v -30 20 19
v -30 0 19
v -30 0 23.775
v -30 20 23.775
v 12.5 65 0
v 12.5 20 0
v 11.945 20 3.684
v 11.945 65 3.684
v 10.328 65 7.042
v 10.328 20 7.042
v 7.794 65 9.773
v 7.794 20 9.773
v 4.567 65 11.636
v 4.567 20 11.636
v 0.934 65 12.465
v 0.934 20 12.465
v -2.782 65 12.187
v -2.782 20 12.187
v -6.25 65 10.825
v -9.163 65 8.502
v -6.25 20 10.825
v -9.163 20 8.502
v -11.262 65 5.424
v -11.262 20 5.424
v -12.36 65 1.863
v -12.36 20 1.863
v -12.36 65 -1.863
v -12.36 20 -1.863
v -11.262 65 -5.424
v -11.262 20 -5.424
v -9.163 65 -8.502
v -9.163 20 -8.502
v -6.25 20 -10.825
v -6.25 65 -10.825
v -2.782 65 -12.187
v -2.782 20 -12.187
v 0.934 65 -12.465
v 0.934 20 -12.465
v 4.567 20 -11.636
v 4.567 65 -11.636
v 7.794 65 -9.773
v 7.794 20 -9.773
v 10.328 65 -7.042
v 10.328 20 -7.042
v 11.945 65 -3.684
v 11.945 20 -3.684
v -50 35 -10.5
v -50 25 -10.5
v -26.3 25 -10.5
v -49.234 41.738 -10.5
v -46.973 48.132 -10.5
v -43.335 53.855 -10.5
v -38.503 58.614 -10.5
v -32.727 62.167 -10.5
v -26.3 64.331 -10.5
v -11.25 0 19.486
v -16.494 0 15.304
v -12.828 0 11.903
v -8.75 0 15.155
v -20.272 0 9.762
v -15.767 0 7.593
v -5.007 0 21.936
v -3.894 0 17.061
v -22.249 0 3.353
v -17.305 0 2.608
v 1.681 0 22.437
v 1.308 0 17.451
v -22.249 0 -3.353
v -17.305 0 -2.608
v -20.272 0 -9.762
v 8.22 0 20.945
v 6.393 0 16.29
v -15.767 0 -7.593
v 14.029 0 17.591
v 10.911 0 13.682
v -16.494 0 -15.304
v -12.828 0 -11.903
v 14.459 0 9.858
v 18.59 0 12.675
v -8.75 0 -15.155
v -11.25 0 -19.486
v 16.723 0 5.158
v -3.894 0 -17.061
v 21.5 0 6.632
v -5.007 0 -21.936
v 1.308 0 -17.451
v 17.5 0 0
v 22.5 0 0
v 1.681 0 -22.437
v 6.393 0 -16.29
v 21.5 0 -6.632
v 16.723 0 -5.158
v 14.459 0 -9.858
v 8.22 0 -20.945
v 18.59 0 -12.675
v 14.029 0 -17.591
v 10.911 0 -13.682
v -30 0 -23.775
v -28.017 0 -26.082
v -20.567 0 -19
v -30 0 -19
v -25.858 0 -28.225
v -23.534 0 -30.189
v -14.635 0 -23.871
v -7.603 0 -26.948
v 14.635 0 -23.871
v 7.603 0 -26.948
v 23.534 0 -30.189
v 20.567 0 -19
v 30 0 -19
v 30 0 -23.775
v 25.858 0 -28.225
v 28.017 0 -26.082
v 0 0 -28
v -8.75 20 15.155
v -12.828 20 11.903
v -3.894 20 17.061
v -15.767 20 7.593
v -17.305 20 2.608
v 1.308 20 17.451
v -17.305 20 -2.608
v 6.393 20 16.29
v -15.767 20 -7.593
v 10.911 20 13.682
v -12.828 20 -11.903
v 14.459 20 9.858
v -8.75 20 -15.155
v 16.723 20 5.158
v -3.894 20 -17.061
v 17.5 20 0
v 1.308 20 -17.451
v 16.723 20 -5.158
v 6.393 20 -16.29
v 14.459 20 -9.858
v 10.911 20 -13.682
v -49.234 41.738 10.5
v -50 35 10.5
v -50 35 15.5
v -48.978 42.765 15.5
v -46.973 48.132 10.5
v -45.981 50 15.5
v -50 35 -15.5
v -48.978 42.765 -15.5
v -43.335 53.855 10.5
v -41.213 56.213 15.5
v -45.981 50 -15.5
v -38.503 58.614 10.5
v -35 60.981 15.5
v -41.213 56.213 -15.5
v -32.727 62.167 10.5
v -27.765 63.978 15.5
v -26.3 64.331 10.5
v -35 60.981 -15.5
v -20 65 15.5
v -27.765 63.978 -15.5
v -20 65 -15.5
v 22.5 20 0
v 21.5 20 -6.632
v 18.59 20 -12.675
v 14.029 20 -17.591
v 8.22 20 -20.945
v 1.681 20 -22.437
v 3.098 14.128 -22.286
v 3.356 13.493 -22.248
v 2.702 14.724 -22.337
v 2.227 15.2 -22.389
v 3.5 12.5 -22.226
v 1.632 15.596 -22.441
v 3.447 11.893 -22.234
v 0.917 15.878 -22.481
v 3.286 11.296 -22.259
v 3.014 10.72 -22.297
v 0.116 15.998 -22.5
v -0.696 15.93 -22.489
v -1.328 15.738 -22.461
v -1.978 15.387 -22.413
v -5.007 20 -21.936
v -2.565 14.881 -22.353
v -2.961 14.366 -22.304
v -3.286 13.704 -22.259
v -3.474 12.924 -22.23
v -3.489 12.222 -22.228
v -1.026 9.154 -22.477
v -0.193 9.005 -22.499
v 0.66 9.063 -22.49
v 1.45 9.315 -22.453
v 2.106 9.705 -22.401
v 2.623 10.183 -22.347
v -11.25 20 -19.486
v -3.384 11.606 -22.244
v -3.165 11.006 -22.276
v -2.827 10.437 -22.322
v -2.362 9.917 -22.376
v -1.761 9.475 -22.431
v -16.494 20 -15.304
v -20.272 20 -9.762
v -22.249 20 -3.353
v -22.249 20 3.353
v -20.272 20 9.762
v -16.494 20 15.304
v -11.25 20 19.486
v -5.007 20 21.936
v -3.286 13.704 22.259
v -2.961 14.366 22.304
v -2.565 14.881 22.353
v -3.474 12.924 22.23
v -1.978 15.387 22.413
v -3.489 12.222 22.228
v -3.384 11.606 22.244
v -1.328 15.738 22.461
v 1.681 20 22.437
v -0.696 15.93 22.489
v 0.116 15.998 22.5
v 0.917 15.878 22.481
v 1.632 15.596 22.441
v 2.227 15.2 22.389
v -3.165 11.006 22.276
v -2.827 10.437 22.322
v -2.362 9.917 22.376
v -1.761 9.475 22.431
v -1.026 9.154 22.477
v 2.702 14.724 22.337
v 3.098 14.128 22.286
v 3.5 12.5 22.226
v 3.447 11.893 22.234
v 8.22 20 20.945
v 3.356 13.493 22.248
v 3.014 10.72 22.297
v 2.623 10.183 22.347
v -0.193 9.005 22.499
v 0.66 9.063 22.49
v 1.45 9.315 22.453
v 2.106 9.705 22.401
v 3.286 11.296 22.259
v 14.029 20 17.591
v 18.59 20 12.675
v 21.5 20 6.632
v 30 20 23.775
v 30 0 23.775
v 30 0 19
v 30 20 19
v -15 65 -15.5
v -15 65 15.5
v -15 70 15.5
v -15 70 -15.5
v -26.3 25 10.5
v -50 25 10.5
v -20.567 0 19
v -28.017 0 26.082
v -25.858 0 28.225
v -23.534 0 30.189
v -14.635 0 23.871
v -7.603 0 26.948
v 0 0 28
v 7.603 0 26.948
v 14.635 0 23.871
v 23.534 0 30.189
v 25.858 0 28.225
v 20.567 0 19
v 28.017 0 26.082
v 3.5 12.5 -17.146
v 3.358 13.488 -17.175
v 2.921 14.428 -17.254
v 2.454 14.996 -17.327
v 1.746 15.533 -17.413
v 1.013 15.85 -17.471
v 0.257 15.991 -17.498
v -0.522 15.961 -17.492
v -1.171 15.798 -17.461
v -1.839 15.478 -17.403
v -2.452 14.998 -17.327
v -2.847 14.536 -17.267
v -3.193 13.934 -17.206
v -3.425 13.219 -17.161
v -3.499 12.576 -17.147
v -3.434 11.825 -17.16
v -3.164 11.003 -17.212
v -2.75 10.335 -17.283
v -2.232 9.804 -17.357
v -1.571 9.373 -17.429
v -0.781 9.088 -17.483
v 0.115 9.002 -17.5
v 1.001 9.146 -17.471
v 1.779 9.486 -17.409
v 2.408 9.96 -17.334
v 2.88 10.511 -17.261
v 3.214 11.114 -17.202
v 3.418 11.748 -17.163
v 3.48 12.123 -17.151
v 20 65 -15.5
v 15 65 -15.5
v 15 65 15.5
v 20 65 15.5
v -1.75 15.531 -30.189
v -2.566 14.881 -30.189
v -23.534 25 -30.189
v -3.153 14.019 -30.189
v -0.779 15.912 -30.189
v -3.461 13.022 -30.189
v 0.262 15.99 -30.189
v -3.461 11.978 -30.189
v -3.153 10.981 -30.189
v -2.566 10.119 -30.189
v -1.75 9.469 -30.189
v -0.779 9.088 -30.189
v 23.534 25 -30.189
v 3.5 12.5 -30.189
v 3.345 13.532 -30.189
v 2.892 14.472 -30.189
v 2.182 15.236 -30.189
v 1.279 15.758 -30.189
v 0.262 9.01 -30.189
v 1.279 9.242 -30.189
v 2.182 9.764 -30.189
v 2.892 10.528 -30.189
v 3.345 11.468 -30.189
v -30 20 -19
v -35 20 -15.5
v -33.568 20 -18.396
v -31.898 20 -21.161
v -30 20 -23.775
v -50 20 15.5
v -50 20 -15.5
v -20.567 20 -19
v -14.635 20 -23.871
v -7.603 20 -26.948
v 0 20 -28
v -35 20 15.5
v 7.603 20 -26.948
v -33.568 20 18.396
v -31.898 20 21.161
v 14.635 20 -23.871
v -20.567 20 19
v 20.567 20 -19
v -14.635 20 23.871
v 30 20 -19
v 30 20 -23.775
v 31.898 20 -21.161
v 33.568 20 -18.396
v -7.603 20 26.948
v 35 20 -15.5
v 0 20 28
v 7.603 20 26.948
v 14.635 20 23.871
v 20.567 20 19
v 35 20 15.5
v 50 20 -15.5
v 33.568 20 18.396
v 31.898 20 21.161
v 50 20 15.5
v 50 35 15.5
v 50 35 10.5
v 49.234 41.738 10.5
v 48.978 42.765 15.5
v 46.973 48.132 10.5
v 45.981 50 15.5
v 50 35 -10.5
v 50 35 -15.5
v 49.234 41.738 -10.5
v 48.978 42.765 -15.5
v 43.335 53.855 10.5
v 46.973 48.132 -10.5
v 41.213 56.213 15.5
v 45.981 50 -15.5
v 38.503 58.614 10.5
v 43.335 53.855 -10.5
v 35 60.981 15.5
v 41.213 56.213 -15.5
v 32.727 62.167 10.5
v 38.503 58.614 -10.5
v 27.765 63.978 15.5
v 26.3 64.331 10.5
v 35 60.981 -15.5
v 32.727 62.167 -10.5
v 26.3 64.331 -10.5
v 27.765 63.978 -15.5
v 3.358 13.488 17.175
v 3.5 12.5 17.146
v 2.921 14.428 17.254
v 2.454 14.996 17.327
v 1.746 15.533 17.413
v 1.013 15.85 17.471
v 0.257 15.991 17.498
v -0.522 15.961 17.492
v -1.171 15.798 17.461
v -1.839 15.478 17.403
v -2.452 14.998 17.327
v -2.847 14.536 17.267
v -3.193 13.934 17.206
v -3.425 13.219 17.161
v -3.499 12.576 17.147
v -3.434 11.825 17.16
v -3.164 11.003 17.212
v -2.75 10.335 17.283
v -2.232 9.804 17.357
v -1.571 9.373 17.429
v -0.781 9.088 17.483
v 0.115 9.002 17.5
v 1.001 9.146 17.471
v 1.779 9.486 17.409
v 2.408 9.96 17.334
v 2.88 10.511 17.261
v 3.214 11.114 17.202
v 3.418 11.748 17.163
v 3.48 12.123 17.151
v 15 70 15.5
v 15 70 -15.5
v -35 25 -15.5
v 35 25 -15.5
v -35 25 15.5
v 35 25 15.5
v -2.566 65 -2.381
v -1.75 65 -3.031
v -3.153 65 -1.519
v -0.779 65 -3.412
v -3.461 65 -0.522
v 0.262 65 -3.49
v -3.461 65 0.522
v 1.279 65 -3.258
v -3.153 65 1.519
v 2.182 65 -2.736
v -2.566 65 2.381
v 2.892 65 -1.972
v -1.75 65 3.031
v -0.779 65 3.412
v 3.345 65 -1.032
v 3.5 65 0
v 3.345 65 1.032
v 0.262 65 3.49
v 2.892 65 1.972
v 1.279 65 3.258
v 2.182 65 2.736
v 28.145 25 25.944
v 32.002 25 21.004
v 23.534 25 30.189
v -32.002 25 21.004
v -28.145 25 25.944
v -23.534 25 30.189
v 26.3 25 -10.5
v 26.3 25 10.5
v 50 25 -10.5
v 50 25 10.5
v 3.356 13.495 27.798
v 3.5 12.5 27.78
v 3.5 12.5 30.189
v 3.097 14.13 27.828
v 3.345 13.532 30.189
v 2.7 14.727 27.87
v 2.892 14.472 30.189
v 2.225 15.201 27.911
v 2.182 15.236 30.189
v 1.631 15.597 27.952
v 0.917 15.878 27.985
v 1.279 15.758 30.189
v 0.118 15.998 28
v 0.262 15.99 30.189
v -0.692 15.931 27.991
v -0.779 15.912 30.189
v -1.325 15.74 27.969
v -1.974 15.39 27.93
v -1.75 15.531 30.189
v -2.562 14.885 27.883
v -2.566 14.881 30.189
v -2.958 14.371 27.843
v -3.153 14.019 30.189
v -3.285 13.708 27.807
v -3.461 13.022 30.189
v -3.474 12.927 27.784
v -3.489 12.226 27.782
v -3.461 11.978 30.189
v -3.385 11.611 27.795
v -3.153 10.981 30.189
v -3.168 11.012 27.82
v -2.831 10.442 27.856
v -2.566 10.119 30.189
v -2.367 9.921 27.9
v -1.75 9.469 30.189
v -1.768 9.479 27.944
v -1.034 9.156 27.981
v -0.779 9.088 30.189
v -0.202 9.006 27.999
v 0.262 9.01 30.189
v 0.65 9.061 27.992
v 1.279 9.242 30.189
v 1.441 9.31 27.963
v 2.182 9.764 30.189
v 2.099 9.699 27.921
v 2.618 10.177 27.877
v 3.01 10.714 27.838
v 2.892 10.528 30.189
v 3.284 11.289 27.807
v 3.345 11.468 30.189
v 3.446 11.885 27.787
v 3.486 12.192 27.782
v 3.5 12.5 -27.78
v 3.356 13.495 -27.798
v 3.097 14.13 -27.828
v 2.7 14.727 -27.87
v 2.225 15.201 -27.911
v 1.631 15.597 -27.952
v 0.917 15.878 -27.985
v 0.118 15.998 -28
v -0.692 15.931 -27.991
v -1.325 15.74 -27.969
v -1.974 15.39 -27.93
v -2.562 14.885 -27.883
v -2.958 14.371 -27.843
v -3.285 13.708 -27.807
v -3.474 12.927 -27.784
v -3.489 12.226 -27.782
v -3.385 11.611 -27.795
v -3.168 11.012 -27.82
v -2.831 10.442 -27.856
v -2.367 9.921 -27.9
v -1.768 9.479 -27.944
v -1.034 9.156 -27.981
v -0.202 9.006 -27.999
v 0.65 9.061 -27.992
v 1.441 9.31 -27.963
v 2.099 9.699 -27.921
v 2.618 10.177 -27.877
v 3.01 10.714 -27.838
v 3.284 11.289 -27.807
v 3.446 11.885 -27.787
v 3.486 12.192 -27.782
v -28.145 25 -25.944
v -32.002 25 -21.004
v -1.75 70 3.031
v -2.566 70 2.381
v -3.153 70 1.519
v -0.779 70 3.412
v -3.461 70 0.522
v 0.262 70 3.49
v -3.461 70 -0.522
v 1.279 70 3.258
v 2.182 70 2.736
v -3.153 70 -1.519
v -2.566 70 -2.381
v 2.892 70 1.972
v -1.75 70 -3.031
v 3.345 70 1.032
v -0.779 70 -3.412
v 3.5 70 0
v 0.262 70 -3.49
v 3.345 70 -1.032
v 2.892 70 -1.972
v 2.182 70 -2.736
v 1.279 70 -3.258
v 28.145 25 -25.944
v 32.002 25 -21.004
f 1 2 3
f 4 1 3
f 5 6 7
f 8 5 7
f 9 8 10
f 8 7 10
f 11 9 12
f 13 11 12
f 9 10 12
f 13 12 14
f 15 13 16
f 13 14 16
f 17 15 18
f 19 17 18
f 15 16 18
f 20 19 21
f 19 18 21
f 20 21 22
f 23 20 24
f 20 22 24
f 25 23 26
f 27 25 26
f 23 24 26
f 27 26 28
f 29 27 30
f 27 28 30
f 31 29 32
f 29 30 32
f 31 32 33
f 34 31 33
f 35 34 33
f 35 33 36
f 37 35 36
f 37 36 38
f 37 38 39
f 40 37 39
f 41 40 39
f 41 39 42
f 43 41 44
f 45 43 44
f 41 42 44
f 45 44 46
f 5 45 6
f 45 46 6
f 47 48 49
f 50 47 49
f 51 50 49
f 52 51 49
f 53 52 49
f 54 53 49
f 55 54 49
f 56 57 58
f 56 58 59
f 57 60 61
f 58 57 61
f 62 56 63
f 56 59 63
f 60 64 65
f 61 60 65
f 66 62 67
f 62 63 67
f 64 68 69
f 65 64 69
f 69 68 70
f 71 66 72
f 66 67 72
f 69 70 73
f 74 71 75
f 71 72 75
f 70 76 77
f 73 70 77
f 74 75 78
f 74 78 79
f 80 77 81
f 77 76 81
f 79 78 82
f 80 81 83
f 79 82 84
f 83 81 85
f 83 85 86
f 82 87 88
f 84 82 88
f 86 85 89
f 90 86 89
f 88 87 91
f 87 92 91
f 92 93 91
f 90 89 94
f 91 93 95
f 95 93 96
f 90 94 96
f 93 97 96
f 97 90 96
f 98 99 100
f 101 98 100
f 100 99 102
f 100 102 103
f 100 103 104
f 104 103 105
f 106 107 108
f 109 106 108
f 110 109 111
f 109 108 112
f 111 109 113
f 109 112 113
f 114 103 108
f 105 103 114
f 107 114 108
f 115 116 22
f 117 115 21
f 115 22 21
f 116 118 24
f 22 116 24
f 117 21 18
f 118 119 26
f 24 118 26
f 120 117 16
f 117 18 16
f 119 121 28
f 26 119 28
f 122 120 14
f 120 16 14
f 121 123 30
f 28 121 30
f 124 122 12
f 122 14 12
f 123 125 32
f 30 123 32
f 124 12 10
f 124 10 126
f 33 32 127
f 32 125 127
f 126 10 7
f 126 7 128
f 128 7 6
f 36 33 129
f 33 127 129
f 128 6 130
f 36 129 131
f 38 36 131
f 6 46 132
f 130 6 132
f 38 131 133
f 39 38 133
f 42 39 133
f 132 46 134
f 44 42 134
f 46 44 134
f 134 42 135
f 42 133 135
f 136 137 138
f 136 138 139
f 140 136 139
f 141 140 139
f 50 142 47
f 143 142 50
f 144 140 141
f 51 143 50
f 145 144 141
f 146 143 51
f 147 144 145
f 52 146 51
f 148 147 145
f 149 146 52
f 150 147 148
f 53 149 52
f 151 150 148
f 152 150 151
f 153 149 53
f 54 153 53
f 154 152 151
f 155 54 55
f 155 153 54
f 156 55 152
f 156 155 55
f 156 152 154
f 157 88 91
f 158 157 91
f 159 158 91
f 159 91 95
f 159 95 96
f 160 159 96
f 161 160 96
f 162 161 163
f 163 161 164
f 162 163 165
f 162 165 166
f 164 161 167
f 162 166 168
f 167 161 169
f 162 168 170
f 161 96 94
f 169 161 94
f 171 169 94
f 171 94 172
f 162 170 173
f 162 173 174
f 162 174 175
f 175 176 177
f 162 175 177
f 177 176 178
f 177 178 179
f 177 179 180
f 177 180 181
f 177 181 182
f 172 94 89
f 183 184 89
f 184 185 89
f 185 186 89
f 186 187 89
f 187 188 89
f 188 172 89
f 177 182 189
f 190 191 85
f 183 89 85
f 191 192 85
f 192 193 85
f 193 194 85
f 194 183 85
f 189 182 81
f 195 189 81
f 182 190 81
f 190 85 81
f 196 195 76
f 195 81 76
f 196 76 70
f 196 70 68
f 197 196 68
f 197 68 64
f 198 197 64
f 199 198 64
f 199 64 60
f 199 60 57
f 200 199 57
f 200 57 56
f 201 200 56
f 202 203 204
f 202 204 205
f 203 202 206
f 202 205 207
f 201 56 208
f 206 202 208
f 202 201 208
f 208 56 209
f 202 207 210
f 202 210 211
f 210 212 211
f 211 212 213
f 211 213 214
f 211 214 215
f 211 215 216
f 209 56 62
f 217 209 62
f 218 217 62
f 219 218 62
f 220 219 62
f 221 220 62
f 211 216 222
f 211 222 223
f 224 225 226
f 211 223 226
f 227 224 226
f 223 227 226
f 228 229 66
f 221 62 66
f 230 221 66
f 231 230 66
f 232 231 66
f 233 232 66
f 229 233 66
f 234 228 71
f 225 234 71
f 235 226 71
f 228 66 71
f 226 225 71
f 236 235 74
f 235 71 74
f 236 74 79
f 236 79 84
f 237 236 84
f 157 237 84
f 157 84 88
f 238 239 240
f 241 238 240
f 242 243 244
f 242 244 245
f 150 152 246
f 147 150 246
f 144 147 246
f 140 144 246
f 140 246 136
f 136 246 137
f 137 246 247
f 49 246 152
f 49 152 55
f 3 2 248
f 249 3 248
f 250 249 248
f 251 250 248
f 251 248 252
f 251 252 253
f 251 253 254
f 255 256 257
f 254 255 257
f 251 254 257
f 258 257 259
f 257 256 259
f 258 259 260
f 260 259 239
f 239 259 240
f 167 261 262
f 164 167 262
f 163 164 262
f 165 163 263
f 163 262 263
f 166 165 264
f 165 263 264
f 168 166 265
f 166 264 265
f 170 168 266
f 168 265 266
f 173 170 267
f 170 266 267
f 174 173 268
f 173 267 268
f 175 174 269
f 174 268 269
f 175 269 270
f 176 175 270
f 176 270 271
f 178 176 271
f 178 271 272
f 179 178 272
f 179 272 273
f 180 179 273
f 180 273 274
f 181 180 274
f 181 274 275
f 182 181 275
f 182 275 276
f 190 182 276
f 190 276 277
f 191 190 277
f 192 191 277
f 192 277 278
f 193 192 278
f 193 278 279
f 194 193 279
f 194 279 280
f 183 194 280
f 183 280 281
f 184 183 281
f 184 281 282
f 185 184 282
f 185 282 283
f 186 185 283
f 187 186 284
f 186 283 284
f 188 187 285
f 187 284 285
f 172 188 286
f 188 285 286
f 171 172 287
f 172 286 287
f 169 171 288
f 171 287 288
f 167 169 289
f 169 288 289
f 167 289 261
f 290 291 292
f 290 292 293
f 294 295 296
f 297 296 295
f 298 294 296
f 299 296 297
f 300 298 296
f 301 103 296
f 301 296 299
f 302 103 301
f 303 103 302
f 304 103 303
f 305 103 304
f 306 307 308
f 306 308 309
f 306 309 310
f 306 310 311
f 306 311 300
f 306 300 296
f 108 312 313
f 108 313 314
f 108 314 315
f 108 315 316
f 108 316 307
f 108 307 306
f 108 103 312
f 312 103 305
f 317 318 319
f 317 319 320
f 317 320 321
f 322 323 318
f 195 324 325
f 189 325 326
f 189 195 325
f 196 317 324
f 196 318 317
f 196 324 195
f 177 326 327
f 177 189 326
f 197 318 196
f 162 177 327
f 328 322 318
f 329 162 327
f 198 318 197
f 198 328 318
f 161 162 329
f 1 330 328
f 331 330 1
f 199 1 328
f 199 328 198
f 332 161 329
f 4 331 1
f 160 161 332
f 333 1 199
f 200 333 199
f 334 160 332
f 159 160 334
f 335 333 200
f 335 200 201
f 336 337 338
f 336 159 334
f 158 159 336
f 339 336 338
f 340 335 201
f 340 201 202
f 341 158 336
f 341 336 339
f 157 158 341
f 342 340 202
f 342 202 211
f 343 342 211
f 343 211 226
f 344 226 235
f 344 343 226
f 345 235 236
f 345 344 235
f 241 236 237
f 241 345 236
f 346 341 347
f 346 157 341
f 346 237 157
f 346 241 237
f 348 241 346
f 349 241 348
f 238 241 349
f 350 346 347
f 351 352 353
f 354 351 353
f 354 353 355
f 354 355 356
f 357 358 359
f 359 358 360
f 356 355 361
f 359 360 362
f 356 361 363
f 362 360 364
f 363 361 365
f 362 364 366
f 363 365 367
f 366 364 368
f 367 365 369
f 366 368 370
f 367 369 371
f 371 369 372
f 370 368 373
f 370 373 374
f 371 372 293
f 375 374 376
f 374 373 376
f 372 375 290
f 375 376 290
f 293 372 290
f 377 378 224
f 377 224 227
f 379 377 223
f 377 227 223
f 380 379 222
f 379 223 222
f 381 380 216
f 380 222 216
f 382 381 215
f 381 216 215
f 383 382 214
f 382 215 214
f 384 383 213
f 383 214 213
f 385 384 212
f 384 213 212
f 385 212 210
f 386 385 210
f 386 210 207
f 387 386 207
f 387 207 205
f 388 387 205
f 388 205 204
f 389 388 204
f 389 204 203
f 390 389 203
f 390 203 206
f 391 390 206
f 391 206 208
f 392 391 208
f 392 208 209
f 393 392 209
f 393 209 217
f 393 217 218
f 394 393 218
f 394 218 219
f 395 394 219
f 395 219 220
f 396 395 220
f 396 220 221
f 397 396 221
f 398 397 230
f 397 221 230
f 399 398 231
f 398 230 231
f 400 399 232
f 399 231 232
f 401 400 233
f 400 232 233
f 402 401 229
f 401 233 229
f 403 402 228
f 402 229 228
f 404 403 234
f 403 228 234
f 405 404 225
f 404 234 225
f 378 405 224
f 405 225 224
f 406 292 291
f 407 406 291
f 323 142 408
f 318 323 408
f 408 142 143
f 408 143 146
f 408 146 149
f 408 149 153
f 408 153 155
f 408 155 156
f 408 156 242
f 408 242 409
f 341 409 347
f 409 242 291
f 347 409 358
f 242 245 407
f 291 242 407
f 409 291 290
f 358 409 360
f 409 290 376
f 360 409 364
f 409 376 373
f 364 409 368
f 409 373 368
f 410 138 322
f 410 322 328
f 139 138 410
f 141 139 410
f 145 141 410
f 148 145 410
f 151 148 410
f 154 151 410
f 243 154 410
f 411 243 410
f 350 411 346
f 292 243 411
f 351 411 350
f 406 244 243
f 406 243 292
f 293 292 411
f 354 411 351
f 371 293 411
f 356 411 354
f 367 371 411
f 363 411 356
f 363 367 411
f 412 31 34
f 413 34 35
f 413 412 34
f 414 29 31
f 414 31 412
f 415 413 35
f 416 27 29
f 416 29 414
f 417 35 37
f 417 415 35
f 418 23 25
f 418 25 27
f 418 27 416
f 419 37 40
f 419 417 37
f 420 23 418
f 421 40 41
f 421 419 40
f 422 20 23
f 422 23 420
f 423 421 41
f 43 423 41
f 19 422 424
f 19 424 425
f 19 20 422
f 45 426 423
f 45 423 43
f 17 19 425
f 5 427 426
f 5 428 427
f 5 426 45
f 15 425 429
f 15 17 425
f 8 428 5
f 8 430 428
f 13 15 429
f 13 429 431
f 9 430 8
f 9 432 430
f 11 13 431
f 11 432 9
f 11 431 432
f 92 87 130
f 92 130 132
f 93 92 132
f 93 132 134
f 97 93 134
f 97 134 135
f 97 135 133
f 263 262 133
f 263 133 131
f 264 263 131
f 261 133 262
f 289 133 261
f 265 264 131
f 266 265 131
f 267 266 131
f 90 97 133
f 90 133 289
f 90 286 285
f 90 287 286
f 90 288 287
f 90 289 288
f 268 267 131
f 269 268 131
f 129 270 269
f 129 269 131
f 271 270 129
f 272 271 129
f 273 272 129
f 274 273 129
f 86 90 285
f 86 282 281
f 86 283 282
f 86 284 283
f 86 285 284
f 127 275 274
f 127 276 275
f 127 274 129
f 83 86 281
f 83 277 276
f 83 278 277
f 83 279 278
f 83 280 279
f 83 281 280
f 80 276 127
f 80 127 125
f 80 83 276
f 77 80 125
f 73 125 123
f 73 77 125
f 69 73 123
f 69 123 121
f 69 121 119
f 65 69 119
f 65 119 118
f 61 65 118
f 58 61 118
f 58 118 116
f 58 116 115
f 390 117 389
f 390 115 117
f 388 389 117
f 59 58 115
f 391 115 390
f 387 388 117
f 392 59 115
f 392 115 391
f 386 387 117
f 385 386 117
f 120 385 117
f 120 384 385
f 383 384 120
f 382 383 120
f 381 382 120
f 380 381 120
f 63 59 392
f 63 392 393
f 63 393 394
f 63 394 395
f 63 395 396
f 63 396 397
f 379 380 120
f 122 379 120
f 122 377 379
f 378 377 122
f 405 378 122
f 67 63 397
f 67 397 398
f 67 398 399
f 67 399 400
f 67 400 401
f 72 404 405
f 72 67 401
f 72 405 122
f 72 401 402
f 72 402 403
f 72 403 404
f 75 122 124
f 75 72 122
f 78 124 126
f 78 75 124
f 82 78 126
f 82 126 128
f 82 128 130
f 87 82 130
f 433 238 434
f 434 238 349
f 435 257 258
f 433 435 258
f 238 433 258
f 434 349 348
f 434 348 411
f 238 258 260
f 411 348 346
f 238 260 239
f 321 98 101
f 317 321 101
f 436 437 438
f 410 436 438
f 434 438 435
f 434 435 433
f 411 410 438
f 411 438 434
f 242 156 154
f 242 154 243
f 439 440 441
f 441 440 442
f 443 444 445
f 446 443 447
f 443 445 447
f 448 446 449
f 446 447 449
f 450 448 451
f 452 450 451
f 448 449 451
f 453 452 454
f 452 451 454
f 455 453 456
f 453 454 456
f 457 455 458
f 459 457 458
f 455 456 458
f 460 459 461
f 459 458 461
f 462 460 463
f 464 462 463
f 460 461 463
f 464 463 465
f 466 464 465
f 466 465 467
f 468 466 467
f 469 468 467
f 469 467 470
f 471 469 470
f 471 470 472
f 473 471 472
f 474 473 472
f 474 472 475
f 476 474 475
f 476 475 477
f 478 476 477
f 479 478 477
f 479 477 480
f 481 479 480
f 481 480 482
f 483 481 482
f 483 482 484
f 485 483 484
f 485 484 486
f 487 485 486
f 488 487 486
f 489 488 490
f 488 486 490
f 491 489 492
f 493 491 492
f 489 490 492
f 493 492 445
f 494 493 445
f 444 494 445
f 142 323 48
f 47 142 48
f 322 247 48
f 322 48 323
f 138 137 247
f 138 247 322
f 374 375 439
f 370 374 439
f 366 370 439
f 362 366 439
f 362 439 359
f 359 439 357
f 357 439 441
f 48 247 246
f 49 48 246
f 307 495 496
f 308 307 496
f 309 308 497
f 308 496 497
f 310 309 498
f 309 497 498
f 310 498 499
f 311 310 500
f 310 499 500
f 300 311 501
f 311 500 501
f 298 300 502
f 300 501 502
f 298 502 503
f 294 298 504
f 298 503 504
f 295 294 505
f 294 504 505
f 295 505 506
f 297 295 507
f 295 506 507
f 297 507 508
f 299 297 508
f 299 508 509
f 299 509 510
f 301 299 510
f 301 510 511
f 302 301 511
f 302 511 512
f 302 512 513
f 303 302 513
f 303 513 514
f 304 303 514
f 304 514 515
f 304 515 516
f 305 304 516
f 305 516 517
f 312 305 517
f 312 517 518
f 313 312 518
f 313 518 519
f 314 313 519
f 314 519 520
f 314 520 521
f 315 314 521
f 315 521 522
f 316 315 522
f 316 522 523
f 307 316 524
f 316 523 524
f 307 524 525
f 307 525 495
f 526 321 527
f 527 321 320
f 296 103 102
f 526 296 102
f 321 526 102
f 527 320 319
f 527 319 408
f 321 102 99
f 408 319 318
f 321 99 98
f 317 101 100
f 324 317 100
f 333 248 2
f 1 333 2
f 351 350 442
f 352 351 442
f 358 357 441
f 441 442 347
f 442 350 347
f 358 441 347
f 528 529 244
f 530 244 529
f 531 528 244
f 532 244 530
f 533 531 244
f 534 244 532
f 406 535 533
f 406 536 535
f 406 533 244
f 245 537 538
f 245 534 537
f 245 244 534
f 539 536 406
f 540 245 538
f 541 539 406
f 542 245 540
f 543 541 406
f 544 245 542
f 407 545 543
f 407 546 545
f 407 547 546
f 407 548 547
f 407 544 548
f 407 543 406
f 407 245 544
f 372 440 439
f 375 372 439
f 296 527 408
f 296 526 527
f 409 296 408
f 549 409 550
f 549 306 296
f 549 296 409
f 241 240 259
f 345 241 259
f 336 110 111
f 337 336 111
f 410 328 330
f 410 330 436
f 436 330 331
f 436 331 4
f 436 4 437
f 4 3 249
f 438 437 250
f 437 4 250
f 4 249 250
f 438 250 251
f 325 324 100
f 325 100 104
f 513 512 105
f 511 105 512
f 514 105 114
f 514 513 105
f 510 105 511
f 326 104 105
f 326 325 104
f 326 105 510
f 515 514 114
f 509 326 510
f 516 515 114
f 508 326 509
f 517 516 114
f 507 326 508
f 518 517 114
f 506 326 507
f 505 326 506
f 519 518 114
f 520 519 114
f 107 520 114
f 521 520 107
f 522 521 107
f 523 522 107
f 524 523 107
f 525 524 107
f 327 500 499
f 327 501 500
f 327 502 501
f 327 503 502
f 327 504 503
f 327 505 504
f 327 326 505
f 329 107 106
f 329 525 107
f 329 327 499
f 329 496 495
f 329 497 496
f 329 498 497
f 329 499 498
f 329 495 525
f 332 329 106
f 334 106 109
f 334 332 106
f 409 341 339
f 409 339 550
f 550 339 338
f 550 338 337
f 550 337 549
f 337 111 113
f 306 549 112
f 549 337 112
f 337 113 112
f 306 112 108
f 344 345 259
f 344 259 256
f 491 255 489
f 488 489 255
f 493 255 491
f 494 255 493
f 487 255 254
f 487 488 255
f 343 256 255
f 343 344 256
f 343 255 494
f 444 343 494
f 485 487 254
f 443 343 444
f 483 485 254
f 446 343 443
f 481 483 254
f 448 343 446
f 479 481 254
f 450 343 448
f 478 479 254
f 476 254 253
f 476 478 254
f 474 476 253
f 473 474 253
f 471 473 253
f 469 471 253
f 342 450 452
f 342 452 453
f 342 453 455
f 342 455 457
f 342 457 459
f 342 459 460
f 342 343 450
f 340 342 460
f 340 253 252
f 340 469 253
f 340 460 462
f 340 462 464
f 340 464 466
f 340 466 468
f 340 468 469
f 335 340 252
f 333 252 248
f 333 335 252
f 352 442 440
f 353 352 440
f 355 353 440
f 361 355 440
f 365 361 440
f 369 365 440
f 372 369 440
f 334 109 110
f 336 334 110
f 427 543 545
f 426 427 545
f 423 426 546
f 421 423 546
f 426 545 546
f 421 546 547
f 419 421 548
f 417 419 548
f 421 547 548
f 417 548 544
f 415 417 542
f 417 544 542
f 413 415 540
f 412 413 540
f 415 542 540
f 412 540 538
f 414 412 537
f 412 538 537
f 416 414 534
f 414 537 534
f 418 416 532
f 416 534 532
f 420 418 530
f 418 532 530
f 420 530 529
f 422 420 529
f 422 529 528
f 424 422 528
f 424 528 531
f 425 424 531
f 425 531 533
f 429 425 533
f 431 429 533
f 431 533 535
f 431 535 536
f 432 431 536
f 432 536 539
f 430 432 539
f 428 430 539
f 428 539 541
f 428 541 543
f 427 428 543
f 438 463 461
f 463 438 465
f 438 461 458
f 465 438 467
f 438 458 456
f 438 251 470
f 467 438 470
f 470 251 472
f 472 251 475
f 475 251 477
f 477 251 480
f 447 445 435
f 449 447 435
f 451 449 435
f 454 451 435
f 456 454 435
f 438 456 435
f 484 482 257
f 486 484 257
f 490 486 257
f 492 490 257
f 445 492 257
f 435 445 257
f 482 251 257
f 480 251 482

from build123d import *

# Parameters (mm, degrees)
SKETCH1_R               = 22.5
SKETCH1_R_2             = 17.5
BOSS_EXTRUDE1_DEPTH     = 20
BOSS_EXTRUDE5_DEPTH     = 20
BOSS_EXTRUDE5_2_DEPTH   = 20
SKETCH5_W               = 70
SKETCH5_H               = 60.378075934
BOSS_EXTRUDE7_DEPTH     = 5
SKETCH6_W               = 15
SKETCH6_H               = 5
SKETCH6_W_2             = 52.6
SKETCH6_H_2             = 21
BOSS_EXTRUDE8_DEPTH     = 40
SKETCH7_W               = 100
SKETCH7_H               = 31
BOSS_EXTRUDE9_DEPTH     = 5
CUT_EXTRUDE1_DEPTH      = 1
CUT_EXTRUDE1_DEPTH_BACK = 66
FILLET1_R               = 30
SKETCH9_W               = 30
SKETCH9_H               = 31
BOSS_EXTRUDE10_DEPTH    = 5
SKETCH10_R              = 3.5
CUT_EXTRUDE2_DEPTH      = 71
SKETCH11_R              = 12.5
CUT_EXTRUDE3_DEPTH      = 45
SKETCH12_R              = 3.5
CUT_EXTRUDE4_DEPTH      = 61.378075935


with BuildPart() as part:
    # Sketch1 → Boss-Extrude1 (new body)
    with BuildSketch(Plane(origin=(0, 0, 0), x_dir=(1, 0, 0), z_dir=(0, 1, 0))):
        Circle(SKETCH1_R)
        Circle(SKETCH1_R_2, mode=Mode.SUBTRACT)
    extrude(amount=BOSS_EXTRUDE1_DEPTH)



with BuildPart() as body_2:
    # Sketch2 → Boss-Extrude5 (new body)
    with BuildSketch(Plane(origin=(0, 20, 0), x_dir=(1, 0, 0), z_dir=(0, 1, 0))):
        with BuildLine():
            Line((-20.566963801, -19), (-30, -19))
            Line((-30, -19), (-30, -30.189037967))
            Line((-30, -30.189037967), (30, -30.189037967))
            Line((30, -30.189037967), (30, -19))
            Line((30, -19), (20.566963801, -19))
            ThreePointArc((20.566963801, -19), (0, -28), (-20.566963801, -19))
        make_face()
    extrude(amount=-BOSS_EXTRUDE5_DEPTH)


with BuildPart() as body_3:
    # Sketch2 → Boss-Extrude5 2 (new body)
    with BuildSketch(Plane(origin=(0, 20, 0), x_dir=(1, 0, 0), z_dir=(0, 1, 0))):
        with BuildLine():
            Line((-30, 30.189037967), (-30, 19))
            Line((-30, 19), (-20.566963801, 19))
            ThreePointArc((-20.566963801, 19), (0, 28), (20.566963801, 19))
            Line((20.566963801, 19), (30, 19))
            Line((30, 19), (30, 30.189037967))
            Line((30, 30.189037967), (-30, 30.189037967))
        make_face()
    extrude(amount=-BOSS_EXTRUDE5_2_DEPTH)


with BuildPart() as part_1:
    add(part.part)

    add(body_2.part)  # Boss-Extrude7 merges body 2

    add(body_3.part)  # Boss-Extrude7 merges body 3
    # Sketch5 → Boss-Extrude7 (add)
    with BuildSketch(Plane(origin=(0, 20, 0), x_dir=(1, 0, 0), z_dir=(0, 1, 0))):
        Rectangle(SKETCH5_W, SKETCH5_H)
    extrude(amount=BOSS_EXTRUDE7_DEPTH)

    # Sketch6 → Boss-Extrude8 (add)
    with BuildSketch(Plane(origin=(0, 25, 0), x_dir=(1, 0, 0), z_dir=(0, 1, 0))):
        Polygon((26.3, -10.5), (-26.3, -10.5), (-35, -10.5), (-35, -15.5), (35, -15.5), (35, -10.5), align=None)
        with Locations((42.5, -13)):
            Rectangle(SKETCH6_W, SKETCH6_H)
        with Locations((-42.5, -13)):
            Rectangle(SKETCH6_W, SKETCH6_H)
        with Locations((-42.5, 13)):
            Rectangle(SKETCH6_W, SKETCH6_H)
        Polygon((-35, 10.5), (-26.3, 10.5), (26.3, 10.5), (35, 10.5), (35, 15.5), (-35, 15.5), align=None)
        with Locations((42.5, 13)):
            Rectangle(SKETCH6_W, SKETCH6_H)
        Rectangle(SKETCH6_W_2, SKETCH6_H_2)
    extrude(amount=BOSS_EXTRUDE8_DEPTH)

    # Sketch7 → Boss-Extrude9 (add)
    with BuildSketch(Plane.XZ.offset(-25)):
        Rectangle(SKETCH7_W, SKETCH7_H)
    extrude(amount=BOSS_EXTRUDE9_DEPTH)

    # Sketch8 → Cut-Extrude1 (cut, two sides)
    with BuildSketch(Plane.XZ) as cut_extrude1_sk:
        with BuildLine():
            ThreePointArc((48.319407886, 15.5), (0, 50.744607383), (-48.319407886, 15.5))
            Line((-48.319407886, 15.5), (-35, 15.5))
            ThreePointArc((-35, 15.5), (0, 38.278584091), (35, 15.5))
            Line((35, 15.5), (48.319407886, 15.5))
        make_face()
        with BuildLine():
            Line((-35, -15.5), (-48.319407886, -15.5))
            ThreePointArc((-48.319407886, -15.5), (0, -50.744607383), (48.319407886, -15.5))
            Line((48.319407886, -15.5), (35, -15.5))
            ThreePointArc((35, -15.5), (0, -38.278584091), (-35, -15.5))
        make_face()
    extrude(amount=CUT_EXTRUDE1_DEPTH, mode=Mode.SUBTRACT)
    extrude(cut_extrude1_sk.sketch, amount=-CUT_EXTRUDE1_DEPTH_BACK, mode=Mode.SUBTRACT)

    # Fillet1
    fillet1_edges = [part_1.edges().sort_by_distance(p)[0] for p in [
        (-50, 65, -13),
        (50, 65, 13),
    ]]
    fillet(fillet1_edges, radius=FILLET1_R)

    # Sketch9 → Boss-Extrude10 (add)
    with BuildSketch(Plane(origin=(0, 65, 0), x_dir=(1, 0, 0), z_dir=(0, 1, 0))):
        Rectangle(SKETCH9_W, SKETCH9_H)
    extrude(amount=BOSS_EXTRUDE10_DEPTH)

    # Sketch10 → Cut-Extrude2 (cut, through all)
    with BuildSketch(Plane(origin=(0, 70, 0), x_dir=(1, 0, 0), z_dir=(0, 1, 0))):
        Circle(SKETCH10_R)
    extrude(amount=-CUT_EXTRUDE2_DEPTH, mode=Mode.SUBTRACT)

    # Sketch11 → Cut-Extrude3 (cut)
    with BuildSketch(Plane.XZ.offset(-20)):
        Circle(SKETCH11_R)
    extrude(amount=-CUT_EXTRUDE3_DEPTH, mode=Mode.SUBTRACT)

    # Sketch12 → Cut-Extrude4 (cut, through all)
    with BuildSketch(Plane.XY.offset(30.189037967)):
        with Locations((0, 12.5)):
            Circle(SKETCH12_R)
    extrude(amount=-CUT_EXTRUDE4_DEPTH, mode=Mode.SUBTRACT)


solid = part_1.part
